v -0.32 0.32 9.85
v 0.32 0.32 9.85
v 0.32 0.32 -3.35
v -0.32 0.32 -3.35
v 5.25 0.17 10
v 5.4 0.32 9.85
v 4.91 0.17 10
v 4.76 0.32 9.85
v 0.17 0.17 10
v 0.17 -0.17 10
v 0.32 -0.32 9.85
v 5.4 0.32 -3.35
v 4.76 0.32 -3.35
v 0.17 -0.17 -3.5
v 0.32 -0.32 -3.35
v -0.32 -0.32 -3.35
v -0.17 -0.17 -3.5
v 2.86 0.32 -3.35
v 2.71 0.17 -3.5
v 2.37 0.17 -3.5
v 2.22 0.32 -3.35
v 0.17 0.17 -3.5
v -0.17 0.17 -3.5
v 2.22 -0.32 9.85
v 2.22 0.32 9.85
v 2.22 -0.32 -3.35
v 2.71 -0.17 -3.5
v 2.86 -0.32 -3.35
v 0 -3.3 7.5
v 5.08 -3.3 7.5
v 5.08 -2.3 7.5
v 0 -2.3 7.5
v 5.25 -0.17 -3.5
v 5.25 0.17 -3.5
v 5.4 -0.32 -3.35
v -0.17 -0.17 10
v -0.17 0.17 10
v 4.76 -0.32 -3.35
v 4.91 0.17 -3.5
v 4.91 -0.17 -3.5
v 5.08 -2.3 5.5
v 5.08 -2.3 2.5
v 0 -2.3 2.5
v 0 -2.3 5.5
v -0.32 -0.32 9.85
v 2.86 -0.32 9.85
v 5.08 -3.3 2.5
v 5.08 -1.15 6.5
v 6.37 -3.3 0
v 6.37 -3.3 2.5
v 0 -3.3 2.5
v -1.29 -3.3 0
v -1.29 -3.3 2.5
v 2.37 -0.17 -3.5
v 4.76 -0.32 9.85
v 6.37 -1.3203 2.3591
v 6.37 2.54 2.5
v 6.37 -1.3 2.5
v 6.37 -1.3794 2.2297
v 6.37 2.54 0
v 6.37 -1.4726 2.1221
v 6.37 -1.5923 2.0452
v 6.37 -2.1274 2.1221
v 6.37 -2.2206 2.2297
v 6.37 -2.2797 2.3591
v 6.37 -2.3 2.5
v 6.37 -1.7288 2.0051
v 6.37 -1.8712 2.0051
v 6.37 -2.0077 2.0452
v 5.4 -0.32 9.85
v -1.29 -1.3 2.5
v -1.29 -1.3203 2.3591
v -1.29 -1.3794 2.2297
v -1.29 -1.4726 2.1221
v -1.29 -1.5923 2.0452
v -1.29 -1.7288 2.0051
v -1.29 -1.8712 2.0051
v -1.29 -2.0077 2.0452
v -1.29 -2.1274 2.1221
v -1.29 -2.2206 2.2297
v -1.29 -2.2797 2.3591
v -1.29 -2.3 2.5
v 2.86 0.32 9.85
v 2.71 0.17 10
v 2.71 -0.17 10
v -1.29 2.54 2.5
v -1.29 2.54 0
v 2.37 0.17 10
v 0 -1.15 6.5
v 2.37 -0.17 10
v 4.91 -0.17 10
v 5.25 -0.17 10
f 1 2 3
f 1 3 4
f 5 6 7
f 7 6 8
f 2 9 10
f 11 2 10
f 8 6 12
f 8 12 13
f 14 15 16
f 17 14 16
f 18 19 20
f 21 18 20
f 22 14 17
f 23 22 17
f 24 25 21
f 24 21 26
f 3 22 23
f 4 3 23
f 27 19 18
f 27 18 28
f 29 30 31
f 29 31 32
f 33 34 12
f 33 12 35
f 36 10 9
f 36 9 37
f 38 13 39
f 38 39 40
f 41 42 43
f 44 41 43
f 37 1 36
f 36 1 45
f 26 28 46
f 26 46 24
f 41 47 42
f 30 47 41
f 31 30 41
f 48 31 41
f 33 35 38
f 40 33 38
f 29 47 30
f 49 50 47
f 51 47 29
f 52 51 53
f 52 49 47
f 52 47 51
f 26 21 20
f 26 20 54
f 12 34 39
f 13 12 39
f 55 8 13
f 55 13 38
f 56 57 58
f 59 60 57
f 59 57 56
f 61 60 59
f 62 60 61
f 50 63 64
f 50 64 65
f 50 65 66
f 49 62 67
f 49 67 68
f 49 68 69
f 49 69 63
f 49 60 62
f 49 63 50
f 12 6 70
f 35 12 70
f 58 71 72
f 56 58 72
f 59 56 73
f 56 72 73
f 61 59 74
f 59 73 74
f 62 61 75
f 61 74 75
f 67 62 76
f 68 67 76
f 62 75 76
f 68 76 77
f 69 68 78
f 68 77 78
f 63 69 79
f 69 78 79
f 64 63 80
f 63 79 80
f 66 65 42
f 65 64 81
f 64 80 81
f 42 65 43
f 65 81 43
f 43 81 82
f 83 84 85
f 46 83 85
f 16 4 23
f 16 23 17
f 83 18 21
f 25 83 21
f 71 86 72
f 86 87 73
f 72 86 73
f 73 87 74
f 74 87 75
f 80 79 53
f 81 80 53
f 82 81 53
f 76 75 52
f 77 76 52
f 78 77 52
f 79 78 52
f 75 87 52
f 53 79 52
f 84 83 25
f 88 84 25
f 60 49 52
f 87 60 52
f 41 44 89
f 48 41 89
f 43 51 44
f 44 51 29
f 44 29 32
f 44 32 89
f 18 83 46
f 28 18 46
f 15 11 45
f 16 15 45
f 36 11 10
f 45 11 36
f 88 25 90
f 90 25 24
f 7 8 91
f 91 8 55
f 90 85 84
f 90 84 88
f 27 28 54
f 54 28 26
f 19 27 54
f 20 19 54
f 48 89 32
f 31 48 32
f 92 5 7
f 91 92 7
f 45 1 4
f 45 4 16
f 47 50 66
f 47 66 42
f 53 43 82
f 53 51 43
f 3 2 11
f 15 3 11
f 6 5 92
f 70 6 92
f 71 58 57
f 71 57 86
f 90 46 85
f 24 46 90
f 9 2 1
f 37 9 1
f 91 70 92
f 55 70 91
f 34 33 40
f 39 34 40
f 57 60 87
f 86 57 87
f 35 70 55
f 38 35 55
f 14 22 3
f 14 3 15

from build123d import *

# Parameters (mm, degrees)
SKETCH_W          = 7.66
SKETCH_H          = 5.84
PAD_DEPTH         = 2.5
SKETCH001_W       = 5.08
SKETCH001_H       = 1
PAD001_DEPTH      = 5
PAD002_DEPTH      = 5.08
POCKET_DEPTH      = 7.661
SKETCH011_W       = 0.64
SKETCH011_H       = 0.64
PAD003_DEPTH      = 10
PAD003_DEPTH_BACK = 3.5
CHAMFER002_SIZE   = 0.15
CHAMFER003_SIZE   = 0.15
SKETCH012_W       = 0.64
SKETCH012_H       = 0.64
PAD004_DEPTH      = 10
PAD004_DEPTH_BACK = 3.5
CHAMFER001_SIZE   = 0.15
CHAMFER004_SIZE   = 0.15
SKETCH013_W       = 0.64
SKETCH013_H       = 0.64
PAD005_DEPTH      = 10
PAD005_DEPTH_BACK = 3.5
CHAMFER_SIZE      = 0.15
CHAMFER005_SIZE   = 0.15


with BuildPart() as pocket:
    # Sketch → Pad (new body)
    with BuildSketch(Plane(origin=(0, 0, 0), x_dir=(-1, 0, 0), z_dir=(0, 0, 1))):
        with Locations((-2.54, 0.38)):
            Rectangle(SKETCH_W, SKETCH_H)
    extrude(amount=PAD_DEPTH)

    # Sketch001 → Pad001 (new body)
    with BuildSketch(Plane(origin=(0, 0, 2.5), x_dir=(-1, 0, 0), z_dir=(0, 0, 1))):
        with Locations((-2.54, 2.8)):
            Rectangle(SKETCH001_W, SKETCH001_H)
    extrude(amount=PAD001_DEPTH)

    # Sketch002 → Pad002 (new body)
    with BuildSketch(Plane(origin=(0, 0, 0), x_dir=(0, -1, 0), z_dir=(-1, 0, 0))):
        Polygon((2.3, 7.5), (2.3, 5.5), (1.15, 6.5), align=None)
    extrude(amount=-PAD002_DEPTH)

    # Sketch015 → Pocket (cut, through all)
    with BuildSketch(Plane(origin=(-1.29, 0, 0), x_dir=(0, -1, 0), z_dir=(-1, 0, 0))):
        with BuildLine():
            ThreePointArc((1.3, 2.5), (1.8, 2), (2.3, 2.5))
            Line((1.3, 2.5), (2.3, 2.5))
        make_face()
    extrude(amount=-POCKET_DEPTH, mode=Mode.SUBTRACT)


with BuildPart() as chamfer003:
    # Sketch011 → Pad003 (new body, two sides)
    with BuildSketch(Plane(origin=(0, 0, 0), x_dir=(-1, 0, 0), z_dir=(0, 0, 1))) as pad003_sk:
        Rectangle(SKETCH011_W, SKETCH011_H)
    extrude(amount=PAD003_DEPTH)
    extrude(pad003_sk.sketch, amount=-PAD003_DEPTH_BACK)

    # Chamfer002
    chamfer002_edges = [chamfer003.edges().sort_by_distance(p)[0] for p in [
        (0, -0.32, 10),
        (-0.32, 0, 10),
        (0, 0.32, 10),
        (0.32, 0, 10),
    ]]
    chamfer(chamfer002_edges, length=CHAMFER002_SIZE)

    # Chamfer003
    chamfer003_edges = [chamfer003.edges().sort_by_distance(p)[0] for p in [
        (0, -0.32, -3.5),
        (-0.32, 0, -3.5),
        (0, 0.32, -3.5),
        (0.32, 0, -3.5),
    ]]
    chamfer(chamfer003_edges, length=CHAMFER003_SIZE)


with BuildPart() as chamfer004:
    # Sketch012 → Pad004 (new body, two sides)
    with BuildSketch(Plane(origin=(0, 0, 0), x_dir=(-1, 0, 0), z_dir=(0, 0, 1))) as pad004_sk:
        with Locations((-2.54, 0)):
            Rectangle(SKETCH012_W, SKETCH012_H)
    extrude(amount=PAD004_DEPTH)
    extrude(pad004_sk.sketch, amount=-PAD004_DEPTH_BACK)

    # Chamfer001
    chamfer001_edges = [chamfer004.edges().sort_by_distance(p)[0] for p in [
        (2.54, -0.32, 10),
        (2.22, 0, 10),
        (2.54, 0.32, 10),
        (2.86, 0, 10),
    ]]
    chamfer(chamfer001_edges, length=CHAMFER001_SIZE)

    # Chamfer004
    chamfer004_edges = [chamfer004.edges().sort_by_distance(p)[0] for p in [
        (2.54, -0.32, -3.5),
        (2.22, 0, -3.5),
        (2.54, 0.32, -3.5),
        (2.86, 0, -3.5),
    ]]
    chamfer(chamfer004_edges, length=CHAMFER004_SIZE)


with BuildPart() as chamfer005:
    # Sketch013 → Pad005 (new body, two sides)
    with BuildSketch(Plane(origin=(0, 0, 0), x_dir=(-1, 0, 0), z_dir=(0, 0, 1))) as pad005_sk:
        with Locations((-5.08, 0)):
            Rectangle(SKETCH013_W, SKETCH013_H)
    extrude(amount=PAD005_DEPTH)
    extrude(pad005_sk.sketch, amount=-PAD005_DEPTH_BACK)

    # Chamfer
    chamfer_edges = [chamfer005.edges().sort_by_distance(p)[0] for p in [
        (5.08, -0.32, 10),
        (4.76, 0, 10),
        (5.08, 0.32, 10),
        (5.4, 0, 10),
    ]]
    chamfer(chamfer_edges, length=CHAMFER_SIZE)

    # Chamfer005
    chamfer005_edges = [chamfer005.edges().sort_by_distance(p)[0] for p in [
        (5.08, -0.32, -3.5),
        (4.76, 0, -3.5),
        (5.08, 0.32, -3.5),
        (5.4, 0, -3.5),
    ]]
    chamfer(chamfer005_edges, length=CHAMFER005_SIZE)


solid = Compound([pocket.part, chamfer003.part, chamfer004.part, chamfer005.part])
